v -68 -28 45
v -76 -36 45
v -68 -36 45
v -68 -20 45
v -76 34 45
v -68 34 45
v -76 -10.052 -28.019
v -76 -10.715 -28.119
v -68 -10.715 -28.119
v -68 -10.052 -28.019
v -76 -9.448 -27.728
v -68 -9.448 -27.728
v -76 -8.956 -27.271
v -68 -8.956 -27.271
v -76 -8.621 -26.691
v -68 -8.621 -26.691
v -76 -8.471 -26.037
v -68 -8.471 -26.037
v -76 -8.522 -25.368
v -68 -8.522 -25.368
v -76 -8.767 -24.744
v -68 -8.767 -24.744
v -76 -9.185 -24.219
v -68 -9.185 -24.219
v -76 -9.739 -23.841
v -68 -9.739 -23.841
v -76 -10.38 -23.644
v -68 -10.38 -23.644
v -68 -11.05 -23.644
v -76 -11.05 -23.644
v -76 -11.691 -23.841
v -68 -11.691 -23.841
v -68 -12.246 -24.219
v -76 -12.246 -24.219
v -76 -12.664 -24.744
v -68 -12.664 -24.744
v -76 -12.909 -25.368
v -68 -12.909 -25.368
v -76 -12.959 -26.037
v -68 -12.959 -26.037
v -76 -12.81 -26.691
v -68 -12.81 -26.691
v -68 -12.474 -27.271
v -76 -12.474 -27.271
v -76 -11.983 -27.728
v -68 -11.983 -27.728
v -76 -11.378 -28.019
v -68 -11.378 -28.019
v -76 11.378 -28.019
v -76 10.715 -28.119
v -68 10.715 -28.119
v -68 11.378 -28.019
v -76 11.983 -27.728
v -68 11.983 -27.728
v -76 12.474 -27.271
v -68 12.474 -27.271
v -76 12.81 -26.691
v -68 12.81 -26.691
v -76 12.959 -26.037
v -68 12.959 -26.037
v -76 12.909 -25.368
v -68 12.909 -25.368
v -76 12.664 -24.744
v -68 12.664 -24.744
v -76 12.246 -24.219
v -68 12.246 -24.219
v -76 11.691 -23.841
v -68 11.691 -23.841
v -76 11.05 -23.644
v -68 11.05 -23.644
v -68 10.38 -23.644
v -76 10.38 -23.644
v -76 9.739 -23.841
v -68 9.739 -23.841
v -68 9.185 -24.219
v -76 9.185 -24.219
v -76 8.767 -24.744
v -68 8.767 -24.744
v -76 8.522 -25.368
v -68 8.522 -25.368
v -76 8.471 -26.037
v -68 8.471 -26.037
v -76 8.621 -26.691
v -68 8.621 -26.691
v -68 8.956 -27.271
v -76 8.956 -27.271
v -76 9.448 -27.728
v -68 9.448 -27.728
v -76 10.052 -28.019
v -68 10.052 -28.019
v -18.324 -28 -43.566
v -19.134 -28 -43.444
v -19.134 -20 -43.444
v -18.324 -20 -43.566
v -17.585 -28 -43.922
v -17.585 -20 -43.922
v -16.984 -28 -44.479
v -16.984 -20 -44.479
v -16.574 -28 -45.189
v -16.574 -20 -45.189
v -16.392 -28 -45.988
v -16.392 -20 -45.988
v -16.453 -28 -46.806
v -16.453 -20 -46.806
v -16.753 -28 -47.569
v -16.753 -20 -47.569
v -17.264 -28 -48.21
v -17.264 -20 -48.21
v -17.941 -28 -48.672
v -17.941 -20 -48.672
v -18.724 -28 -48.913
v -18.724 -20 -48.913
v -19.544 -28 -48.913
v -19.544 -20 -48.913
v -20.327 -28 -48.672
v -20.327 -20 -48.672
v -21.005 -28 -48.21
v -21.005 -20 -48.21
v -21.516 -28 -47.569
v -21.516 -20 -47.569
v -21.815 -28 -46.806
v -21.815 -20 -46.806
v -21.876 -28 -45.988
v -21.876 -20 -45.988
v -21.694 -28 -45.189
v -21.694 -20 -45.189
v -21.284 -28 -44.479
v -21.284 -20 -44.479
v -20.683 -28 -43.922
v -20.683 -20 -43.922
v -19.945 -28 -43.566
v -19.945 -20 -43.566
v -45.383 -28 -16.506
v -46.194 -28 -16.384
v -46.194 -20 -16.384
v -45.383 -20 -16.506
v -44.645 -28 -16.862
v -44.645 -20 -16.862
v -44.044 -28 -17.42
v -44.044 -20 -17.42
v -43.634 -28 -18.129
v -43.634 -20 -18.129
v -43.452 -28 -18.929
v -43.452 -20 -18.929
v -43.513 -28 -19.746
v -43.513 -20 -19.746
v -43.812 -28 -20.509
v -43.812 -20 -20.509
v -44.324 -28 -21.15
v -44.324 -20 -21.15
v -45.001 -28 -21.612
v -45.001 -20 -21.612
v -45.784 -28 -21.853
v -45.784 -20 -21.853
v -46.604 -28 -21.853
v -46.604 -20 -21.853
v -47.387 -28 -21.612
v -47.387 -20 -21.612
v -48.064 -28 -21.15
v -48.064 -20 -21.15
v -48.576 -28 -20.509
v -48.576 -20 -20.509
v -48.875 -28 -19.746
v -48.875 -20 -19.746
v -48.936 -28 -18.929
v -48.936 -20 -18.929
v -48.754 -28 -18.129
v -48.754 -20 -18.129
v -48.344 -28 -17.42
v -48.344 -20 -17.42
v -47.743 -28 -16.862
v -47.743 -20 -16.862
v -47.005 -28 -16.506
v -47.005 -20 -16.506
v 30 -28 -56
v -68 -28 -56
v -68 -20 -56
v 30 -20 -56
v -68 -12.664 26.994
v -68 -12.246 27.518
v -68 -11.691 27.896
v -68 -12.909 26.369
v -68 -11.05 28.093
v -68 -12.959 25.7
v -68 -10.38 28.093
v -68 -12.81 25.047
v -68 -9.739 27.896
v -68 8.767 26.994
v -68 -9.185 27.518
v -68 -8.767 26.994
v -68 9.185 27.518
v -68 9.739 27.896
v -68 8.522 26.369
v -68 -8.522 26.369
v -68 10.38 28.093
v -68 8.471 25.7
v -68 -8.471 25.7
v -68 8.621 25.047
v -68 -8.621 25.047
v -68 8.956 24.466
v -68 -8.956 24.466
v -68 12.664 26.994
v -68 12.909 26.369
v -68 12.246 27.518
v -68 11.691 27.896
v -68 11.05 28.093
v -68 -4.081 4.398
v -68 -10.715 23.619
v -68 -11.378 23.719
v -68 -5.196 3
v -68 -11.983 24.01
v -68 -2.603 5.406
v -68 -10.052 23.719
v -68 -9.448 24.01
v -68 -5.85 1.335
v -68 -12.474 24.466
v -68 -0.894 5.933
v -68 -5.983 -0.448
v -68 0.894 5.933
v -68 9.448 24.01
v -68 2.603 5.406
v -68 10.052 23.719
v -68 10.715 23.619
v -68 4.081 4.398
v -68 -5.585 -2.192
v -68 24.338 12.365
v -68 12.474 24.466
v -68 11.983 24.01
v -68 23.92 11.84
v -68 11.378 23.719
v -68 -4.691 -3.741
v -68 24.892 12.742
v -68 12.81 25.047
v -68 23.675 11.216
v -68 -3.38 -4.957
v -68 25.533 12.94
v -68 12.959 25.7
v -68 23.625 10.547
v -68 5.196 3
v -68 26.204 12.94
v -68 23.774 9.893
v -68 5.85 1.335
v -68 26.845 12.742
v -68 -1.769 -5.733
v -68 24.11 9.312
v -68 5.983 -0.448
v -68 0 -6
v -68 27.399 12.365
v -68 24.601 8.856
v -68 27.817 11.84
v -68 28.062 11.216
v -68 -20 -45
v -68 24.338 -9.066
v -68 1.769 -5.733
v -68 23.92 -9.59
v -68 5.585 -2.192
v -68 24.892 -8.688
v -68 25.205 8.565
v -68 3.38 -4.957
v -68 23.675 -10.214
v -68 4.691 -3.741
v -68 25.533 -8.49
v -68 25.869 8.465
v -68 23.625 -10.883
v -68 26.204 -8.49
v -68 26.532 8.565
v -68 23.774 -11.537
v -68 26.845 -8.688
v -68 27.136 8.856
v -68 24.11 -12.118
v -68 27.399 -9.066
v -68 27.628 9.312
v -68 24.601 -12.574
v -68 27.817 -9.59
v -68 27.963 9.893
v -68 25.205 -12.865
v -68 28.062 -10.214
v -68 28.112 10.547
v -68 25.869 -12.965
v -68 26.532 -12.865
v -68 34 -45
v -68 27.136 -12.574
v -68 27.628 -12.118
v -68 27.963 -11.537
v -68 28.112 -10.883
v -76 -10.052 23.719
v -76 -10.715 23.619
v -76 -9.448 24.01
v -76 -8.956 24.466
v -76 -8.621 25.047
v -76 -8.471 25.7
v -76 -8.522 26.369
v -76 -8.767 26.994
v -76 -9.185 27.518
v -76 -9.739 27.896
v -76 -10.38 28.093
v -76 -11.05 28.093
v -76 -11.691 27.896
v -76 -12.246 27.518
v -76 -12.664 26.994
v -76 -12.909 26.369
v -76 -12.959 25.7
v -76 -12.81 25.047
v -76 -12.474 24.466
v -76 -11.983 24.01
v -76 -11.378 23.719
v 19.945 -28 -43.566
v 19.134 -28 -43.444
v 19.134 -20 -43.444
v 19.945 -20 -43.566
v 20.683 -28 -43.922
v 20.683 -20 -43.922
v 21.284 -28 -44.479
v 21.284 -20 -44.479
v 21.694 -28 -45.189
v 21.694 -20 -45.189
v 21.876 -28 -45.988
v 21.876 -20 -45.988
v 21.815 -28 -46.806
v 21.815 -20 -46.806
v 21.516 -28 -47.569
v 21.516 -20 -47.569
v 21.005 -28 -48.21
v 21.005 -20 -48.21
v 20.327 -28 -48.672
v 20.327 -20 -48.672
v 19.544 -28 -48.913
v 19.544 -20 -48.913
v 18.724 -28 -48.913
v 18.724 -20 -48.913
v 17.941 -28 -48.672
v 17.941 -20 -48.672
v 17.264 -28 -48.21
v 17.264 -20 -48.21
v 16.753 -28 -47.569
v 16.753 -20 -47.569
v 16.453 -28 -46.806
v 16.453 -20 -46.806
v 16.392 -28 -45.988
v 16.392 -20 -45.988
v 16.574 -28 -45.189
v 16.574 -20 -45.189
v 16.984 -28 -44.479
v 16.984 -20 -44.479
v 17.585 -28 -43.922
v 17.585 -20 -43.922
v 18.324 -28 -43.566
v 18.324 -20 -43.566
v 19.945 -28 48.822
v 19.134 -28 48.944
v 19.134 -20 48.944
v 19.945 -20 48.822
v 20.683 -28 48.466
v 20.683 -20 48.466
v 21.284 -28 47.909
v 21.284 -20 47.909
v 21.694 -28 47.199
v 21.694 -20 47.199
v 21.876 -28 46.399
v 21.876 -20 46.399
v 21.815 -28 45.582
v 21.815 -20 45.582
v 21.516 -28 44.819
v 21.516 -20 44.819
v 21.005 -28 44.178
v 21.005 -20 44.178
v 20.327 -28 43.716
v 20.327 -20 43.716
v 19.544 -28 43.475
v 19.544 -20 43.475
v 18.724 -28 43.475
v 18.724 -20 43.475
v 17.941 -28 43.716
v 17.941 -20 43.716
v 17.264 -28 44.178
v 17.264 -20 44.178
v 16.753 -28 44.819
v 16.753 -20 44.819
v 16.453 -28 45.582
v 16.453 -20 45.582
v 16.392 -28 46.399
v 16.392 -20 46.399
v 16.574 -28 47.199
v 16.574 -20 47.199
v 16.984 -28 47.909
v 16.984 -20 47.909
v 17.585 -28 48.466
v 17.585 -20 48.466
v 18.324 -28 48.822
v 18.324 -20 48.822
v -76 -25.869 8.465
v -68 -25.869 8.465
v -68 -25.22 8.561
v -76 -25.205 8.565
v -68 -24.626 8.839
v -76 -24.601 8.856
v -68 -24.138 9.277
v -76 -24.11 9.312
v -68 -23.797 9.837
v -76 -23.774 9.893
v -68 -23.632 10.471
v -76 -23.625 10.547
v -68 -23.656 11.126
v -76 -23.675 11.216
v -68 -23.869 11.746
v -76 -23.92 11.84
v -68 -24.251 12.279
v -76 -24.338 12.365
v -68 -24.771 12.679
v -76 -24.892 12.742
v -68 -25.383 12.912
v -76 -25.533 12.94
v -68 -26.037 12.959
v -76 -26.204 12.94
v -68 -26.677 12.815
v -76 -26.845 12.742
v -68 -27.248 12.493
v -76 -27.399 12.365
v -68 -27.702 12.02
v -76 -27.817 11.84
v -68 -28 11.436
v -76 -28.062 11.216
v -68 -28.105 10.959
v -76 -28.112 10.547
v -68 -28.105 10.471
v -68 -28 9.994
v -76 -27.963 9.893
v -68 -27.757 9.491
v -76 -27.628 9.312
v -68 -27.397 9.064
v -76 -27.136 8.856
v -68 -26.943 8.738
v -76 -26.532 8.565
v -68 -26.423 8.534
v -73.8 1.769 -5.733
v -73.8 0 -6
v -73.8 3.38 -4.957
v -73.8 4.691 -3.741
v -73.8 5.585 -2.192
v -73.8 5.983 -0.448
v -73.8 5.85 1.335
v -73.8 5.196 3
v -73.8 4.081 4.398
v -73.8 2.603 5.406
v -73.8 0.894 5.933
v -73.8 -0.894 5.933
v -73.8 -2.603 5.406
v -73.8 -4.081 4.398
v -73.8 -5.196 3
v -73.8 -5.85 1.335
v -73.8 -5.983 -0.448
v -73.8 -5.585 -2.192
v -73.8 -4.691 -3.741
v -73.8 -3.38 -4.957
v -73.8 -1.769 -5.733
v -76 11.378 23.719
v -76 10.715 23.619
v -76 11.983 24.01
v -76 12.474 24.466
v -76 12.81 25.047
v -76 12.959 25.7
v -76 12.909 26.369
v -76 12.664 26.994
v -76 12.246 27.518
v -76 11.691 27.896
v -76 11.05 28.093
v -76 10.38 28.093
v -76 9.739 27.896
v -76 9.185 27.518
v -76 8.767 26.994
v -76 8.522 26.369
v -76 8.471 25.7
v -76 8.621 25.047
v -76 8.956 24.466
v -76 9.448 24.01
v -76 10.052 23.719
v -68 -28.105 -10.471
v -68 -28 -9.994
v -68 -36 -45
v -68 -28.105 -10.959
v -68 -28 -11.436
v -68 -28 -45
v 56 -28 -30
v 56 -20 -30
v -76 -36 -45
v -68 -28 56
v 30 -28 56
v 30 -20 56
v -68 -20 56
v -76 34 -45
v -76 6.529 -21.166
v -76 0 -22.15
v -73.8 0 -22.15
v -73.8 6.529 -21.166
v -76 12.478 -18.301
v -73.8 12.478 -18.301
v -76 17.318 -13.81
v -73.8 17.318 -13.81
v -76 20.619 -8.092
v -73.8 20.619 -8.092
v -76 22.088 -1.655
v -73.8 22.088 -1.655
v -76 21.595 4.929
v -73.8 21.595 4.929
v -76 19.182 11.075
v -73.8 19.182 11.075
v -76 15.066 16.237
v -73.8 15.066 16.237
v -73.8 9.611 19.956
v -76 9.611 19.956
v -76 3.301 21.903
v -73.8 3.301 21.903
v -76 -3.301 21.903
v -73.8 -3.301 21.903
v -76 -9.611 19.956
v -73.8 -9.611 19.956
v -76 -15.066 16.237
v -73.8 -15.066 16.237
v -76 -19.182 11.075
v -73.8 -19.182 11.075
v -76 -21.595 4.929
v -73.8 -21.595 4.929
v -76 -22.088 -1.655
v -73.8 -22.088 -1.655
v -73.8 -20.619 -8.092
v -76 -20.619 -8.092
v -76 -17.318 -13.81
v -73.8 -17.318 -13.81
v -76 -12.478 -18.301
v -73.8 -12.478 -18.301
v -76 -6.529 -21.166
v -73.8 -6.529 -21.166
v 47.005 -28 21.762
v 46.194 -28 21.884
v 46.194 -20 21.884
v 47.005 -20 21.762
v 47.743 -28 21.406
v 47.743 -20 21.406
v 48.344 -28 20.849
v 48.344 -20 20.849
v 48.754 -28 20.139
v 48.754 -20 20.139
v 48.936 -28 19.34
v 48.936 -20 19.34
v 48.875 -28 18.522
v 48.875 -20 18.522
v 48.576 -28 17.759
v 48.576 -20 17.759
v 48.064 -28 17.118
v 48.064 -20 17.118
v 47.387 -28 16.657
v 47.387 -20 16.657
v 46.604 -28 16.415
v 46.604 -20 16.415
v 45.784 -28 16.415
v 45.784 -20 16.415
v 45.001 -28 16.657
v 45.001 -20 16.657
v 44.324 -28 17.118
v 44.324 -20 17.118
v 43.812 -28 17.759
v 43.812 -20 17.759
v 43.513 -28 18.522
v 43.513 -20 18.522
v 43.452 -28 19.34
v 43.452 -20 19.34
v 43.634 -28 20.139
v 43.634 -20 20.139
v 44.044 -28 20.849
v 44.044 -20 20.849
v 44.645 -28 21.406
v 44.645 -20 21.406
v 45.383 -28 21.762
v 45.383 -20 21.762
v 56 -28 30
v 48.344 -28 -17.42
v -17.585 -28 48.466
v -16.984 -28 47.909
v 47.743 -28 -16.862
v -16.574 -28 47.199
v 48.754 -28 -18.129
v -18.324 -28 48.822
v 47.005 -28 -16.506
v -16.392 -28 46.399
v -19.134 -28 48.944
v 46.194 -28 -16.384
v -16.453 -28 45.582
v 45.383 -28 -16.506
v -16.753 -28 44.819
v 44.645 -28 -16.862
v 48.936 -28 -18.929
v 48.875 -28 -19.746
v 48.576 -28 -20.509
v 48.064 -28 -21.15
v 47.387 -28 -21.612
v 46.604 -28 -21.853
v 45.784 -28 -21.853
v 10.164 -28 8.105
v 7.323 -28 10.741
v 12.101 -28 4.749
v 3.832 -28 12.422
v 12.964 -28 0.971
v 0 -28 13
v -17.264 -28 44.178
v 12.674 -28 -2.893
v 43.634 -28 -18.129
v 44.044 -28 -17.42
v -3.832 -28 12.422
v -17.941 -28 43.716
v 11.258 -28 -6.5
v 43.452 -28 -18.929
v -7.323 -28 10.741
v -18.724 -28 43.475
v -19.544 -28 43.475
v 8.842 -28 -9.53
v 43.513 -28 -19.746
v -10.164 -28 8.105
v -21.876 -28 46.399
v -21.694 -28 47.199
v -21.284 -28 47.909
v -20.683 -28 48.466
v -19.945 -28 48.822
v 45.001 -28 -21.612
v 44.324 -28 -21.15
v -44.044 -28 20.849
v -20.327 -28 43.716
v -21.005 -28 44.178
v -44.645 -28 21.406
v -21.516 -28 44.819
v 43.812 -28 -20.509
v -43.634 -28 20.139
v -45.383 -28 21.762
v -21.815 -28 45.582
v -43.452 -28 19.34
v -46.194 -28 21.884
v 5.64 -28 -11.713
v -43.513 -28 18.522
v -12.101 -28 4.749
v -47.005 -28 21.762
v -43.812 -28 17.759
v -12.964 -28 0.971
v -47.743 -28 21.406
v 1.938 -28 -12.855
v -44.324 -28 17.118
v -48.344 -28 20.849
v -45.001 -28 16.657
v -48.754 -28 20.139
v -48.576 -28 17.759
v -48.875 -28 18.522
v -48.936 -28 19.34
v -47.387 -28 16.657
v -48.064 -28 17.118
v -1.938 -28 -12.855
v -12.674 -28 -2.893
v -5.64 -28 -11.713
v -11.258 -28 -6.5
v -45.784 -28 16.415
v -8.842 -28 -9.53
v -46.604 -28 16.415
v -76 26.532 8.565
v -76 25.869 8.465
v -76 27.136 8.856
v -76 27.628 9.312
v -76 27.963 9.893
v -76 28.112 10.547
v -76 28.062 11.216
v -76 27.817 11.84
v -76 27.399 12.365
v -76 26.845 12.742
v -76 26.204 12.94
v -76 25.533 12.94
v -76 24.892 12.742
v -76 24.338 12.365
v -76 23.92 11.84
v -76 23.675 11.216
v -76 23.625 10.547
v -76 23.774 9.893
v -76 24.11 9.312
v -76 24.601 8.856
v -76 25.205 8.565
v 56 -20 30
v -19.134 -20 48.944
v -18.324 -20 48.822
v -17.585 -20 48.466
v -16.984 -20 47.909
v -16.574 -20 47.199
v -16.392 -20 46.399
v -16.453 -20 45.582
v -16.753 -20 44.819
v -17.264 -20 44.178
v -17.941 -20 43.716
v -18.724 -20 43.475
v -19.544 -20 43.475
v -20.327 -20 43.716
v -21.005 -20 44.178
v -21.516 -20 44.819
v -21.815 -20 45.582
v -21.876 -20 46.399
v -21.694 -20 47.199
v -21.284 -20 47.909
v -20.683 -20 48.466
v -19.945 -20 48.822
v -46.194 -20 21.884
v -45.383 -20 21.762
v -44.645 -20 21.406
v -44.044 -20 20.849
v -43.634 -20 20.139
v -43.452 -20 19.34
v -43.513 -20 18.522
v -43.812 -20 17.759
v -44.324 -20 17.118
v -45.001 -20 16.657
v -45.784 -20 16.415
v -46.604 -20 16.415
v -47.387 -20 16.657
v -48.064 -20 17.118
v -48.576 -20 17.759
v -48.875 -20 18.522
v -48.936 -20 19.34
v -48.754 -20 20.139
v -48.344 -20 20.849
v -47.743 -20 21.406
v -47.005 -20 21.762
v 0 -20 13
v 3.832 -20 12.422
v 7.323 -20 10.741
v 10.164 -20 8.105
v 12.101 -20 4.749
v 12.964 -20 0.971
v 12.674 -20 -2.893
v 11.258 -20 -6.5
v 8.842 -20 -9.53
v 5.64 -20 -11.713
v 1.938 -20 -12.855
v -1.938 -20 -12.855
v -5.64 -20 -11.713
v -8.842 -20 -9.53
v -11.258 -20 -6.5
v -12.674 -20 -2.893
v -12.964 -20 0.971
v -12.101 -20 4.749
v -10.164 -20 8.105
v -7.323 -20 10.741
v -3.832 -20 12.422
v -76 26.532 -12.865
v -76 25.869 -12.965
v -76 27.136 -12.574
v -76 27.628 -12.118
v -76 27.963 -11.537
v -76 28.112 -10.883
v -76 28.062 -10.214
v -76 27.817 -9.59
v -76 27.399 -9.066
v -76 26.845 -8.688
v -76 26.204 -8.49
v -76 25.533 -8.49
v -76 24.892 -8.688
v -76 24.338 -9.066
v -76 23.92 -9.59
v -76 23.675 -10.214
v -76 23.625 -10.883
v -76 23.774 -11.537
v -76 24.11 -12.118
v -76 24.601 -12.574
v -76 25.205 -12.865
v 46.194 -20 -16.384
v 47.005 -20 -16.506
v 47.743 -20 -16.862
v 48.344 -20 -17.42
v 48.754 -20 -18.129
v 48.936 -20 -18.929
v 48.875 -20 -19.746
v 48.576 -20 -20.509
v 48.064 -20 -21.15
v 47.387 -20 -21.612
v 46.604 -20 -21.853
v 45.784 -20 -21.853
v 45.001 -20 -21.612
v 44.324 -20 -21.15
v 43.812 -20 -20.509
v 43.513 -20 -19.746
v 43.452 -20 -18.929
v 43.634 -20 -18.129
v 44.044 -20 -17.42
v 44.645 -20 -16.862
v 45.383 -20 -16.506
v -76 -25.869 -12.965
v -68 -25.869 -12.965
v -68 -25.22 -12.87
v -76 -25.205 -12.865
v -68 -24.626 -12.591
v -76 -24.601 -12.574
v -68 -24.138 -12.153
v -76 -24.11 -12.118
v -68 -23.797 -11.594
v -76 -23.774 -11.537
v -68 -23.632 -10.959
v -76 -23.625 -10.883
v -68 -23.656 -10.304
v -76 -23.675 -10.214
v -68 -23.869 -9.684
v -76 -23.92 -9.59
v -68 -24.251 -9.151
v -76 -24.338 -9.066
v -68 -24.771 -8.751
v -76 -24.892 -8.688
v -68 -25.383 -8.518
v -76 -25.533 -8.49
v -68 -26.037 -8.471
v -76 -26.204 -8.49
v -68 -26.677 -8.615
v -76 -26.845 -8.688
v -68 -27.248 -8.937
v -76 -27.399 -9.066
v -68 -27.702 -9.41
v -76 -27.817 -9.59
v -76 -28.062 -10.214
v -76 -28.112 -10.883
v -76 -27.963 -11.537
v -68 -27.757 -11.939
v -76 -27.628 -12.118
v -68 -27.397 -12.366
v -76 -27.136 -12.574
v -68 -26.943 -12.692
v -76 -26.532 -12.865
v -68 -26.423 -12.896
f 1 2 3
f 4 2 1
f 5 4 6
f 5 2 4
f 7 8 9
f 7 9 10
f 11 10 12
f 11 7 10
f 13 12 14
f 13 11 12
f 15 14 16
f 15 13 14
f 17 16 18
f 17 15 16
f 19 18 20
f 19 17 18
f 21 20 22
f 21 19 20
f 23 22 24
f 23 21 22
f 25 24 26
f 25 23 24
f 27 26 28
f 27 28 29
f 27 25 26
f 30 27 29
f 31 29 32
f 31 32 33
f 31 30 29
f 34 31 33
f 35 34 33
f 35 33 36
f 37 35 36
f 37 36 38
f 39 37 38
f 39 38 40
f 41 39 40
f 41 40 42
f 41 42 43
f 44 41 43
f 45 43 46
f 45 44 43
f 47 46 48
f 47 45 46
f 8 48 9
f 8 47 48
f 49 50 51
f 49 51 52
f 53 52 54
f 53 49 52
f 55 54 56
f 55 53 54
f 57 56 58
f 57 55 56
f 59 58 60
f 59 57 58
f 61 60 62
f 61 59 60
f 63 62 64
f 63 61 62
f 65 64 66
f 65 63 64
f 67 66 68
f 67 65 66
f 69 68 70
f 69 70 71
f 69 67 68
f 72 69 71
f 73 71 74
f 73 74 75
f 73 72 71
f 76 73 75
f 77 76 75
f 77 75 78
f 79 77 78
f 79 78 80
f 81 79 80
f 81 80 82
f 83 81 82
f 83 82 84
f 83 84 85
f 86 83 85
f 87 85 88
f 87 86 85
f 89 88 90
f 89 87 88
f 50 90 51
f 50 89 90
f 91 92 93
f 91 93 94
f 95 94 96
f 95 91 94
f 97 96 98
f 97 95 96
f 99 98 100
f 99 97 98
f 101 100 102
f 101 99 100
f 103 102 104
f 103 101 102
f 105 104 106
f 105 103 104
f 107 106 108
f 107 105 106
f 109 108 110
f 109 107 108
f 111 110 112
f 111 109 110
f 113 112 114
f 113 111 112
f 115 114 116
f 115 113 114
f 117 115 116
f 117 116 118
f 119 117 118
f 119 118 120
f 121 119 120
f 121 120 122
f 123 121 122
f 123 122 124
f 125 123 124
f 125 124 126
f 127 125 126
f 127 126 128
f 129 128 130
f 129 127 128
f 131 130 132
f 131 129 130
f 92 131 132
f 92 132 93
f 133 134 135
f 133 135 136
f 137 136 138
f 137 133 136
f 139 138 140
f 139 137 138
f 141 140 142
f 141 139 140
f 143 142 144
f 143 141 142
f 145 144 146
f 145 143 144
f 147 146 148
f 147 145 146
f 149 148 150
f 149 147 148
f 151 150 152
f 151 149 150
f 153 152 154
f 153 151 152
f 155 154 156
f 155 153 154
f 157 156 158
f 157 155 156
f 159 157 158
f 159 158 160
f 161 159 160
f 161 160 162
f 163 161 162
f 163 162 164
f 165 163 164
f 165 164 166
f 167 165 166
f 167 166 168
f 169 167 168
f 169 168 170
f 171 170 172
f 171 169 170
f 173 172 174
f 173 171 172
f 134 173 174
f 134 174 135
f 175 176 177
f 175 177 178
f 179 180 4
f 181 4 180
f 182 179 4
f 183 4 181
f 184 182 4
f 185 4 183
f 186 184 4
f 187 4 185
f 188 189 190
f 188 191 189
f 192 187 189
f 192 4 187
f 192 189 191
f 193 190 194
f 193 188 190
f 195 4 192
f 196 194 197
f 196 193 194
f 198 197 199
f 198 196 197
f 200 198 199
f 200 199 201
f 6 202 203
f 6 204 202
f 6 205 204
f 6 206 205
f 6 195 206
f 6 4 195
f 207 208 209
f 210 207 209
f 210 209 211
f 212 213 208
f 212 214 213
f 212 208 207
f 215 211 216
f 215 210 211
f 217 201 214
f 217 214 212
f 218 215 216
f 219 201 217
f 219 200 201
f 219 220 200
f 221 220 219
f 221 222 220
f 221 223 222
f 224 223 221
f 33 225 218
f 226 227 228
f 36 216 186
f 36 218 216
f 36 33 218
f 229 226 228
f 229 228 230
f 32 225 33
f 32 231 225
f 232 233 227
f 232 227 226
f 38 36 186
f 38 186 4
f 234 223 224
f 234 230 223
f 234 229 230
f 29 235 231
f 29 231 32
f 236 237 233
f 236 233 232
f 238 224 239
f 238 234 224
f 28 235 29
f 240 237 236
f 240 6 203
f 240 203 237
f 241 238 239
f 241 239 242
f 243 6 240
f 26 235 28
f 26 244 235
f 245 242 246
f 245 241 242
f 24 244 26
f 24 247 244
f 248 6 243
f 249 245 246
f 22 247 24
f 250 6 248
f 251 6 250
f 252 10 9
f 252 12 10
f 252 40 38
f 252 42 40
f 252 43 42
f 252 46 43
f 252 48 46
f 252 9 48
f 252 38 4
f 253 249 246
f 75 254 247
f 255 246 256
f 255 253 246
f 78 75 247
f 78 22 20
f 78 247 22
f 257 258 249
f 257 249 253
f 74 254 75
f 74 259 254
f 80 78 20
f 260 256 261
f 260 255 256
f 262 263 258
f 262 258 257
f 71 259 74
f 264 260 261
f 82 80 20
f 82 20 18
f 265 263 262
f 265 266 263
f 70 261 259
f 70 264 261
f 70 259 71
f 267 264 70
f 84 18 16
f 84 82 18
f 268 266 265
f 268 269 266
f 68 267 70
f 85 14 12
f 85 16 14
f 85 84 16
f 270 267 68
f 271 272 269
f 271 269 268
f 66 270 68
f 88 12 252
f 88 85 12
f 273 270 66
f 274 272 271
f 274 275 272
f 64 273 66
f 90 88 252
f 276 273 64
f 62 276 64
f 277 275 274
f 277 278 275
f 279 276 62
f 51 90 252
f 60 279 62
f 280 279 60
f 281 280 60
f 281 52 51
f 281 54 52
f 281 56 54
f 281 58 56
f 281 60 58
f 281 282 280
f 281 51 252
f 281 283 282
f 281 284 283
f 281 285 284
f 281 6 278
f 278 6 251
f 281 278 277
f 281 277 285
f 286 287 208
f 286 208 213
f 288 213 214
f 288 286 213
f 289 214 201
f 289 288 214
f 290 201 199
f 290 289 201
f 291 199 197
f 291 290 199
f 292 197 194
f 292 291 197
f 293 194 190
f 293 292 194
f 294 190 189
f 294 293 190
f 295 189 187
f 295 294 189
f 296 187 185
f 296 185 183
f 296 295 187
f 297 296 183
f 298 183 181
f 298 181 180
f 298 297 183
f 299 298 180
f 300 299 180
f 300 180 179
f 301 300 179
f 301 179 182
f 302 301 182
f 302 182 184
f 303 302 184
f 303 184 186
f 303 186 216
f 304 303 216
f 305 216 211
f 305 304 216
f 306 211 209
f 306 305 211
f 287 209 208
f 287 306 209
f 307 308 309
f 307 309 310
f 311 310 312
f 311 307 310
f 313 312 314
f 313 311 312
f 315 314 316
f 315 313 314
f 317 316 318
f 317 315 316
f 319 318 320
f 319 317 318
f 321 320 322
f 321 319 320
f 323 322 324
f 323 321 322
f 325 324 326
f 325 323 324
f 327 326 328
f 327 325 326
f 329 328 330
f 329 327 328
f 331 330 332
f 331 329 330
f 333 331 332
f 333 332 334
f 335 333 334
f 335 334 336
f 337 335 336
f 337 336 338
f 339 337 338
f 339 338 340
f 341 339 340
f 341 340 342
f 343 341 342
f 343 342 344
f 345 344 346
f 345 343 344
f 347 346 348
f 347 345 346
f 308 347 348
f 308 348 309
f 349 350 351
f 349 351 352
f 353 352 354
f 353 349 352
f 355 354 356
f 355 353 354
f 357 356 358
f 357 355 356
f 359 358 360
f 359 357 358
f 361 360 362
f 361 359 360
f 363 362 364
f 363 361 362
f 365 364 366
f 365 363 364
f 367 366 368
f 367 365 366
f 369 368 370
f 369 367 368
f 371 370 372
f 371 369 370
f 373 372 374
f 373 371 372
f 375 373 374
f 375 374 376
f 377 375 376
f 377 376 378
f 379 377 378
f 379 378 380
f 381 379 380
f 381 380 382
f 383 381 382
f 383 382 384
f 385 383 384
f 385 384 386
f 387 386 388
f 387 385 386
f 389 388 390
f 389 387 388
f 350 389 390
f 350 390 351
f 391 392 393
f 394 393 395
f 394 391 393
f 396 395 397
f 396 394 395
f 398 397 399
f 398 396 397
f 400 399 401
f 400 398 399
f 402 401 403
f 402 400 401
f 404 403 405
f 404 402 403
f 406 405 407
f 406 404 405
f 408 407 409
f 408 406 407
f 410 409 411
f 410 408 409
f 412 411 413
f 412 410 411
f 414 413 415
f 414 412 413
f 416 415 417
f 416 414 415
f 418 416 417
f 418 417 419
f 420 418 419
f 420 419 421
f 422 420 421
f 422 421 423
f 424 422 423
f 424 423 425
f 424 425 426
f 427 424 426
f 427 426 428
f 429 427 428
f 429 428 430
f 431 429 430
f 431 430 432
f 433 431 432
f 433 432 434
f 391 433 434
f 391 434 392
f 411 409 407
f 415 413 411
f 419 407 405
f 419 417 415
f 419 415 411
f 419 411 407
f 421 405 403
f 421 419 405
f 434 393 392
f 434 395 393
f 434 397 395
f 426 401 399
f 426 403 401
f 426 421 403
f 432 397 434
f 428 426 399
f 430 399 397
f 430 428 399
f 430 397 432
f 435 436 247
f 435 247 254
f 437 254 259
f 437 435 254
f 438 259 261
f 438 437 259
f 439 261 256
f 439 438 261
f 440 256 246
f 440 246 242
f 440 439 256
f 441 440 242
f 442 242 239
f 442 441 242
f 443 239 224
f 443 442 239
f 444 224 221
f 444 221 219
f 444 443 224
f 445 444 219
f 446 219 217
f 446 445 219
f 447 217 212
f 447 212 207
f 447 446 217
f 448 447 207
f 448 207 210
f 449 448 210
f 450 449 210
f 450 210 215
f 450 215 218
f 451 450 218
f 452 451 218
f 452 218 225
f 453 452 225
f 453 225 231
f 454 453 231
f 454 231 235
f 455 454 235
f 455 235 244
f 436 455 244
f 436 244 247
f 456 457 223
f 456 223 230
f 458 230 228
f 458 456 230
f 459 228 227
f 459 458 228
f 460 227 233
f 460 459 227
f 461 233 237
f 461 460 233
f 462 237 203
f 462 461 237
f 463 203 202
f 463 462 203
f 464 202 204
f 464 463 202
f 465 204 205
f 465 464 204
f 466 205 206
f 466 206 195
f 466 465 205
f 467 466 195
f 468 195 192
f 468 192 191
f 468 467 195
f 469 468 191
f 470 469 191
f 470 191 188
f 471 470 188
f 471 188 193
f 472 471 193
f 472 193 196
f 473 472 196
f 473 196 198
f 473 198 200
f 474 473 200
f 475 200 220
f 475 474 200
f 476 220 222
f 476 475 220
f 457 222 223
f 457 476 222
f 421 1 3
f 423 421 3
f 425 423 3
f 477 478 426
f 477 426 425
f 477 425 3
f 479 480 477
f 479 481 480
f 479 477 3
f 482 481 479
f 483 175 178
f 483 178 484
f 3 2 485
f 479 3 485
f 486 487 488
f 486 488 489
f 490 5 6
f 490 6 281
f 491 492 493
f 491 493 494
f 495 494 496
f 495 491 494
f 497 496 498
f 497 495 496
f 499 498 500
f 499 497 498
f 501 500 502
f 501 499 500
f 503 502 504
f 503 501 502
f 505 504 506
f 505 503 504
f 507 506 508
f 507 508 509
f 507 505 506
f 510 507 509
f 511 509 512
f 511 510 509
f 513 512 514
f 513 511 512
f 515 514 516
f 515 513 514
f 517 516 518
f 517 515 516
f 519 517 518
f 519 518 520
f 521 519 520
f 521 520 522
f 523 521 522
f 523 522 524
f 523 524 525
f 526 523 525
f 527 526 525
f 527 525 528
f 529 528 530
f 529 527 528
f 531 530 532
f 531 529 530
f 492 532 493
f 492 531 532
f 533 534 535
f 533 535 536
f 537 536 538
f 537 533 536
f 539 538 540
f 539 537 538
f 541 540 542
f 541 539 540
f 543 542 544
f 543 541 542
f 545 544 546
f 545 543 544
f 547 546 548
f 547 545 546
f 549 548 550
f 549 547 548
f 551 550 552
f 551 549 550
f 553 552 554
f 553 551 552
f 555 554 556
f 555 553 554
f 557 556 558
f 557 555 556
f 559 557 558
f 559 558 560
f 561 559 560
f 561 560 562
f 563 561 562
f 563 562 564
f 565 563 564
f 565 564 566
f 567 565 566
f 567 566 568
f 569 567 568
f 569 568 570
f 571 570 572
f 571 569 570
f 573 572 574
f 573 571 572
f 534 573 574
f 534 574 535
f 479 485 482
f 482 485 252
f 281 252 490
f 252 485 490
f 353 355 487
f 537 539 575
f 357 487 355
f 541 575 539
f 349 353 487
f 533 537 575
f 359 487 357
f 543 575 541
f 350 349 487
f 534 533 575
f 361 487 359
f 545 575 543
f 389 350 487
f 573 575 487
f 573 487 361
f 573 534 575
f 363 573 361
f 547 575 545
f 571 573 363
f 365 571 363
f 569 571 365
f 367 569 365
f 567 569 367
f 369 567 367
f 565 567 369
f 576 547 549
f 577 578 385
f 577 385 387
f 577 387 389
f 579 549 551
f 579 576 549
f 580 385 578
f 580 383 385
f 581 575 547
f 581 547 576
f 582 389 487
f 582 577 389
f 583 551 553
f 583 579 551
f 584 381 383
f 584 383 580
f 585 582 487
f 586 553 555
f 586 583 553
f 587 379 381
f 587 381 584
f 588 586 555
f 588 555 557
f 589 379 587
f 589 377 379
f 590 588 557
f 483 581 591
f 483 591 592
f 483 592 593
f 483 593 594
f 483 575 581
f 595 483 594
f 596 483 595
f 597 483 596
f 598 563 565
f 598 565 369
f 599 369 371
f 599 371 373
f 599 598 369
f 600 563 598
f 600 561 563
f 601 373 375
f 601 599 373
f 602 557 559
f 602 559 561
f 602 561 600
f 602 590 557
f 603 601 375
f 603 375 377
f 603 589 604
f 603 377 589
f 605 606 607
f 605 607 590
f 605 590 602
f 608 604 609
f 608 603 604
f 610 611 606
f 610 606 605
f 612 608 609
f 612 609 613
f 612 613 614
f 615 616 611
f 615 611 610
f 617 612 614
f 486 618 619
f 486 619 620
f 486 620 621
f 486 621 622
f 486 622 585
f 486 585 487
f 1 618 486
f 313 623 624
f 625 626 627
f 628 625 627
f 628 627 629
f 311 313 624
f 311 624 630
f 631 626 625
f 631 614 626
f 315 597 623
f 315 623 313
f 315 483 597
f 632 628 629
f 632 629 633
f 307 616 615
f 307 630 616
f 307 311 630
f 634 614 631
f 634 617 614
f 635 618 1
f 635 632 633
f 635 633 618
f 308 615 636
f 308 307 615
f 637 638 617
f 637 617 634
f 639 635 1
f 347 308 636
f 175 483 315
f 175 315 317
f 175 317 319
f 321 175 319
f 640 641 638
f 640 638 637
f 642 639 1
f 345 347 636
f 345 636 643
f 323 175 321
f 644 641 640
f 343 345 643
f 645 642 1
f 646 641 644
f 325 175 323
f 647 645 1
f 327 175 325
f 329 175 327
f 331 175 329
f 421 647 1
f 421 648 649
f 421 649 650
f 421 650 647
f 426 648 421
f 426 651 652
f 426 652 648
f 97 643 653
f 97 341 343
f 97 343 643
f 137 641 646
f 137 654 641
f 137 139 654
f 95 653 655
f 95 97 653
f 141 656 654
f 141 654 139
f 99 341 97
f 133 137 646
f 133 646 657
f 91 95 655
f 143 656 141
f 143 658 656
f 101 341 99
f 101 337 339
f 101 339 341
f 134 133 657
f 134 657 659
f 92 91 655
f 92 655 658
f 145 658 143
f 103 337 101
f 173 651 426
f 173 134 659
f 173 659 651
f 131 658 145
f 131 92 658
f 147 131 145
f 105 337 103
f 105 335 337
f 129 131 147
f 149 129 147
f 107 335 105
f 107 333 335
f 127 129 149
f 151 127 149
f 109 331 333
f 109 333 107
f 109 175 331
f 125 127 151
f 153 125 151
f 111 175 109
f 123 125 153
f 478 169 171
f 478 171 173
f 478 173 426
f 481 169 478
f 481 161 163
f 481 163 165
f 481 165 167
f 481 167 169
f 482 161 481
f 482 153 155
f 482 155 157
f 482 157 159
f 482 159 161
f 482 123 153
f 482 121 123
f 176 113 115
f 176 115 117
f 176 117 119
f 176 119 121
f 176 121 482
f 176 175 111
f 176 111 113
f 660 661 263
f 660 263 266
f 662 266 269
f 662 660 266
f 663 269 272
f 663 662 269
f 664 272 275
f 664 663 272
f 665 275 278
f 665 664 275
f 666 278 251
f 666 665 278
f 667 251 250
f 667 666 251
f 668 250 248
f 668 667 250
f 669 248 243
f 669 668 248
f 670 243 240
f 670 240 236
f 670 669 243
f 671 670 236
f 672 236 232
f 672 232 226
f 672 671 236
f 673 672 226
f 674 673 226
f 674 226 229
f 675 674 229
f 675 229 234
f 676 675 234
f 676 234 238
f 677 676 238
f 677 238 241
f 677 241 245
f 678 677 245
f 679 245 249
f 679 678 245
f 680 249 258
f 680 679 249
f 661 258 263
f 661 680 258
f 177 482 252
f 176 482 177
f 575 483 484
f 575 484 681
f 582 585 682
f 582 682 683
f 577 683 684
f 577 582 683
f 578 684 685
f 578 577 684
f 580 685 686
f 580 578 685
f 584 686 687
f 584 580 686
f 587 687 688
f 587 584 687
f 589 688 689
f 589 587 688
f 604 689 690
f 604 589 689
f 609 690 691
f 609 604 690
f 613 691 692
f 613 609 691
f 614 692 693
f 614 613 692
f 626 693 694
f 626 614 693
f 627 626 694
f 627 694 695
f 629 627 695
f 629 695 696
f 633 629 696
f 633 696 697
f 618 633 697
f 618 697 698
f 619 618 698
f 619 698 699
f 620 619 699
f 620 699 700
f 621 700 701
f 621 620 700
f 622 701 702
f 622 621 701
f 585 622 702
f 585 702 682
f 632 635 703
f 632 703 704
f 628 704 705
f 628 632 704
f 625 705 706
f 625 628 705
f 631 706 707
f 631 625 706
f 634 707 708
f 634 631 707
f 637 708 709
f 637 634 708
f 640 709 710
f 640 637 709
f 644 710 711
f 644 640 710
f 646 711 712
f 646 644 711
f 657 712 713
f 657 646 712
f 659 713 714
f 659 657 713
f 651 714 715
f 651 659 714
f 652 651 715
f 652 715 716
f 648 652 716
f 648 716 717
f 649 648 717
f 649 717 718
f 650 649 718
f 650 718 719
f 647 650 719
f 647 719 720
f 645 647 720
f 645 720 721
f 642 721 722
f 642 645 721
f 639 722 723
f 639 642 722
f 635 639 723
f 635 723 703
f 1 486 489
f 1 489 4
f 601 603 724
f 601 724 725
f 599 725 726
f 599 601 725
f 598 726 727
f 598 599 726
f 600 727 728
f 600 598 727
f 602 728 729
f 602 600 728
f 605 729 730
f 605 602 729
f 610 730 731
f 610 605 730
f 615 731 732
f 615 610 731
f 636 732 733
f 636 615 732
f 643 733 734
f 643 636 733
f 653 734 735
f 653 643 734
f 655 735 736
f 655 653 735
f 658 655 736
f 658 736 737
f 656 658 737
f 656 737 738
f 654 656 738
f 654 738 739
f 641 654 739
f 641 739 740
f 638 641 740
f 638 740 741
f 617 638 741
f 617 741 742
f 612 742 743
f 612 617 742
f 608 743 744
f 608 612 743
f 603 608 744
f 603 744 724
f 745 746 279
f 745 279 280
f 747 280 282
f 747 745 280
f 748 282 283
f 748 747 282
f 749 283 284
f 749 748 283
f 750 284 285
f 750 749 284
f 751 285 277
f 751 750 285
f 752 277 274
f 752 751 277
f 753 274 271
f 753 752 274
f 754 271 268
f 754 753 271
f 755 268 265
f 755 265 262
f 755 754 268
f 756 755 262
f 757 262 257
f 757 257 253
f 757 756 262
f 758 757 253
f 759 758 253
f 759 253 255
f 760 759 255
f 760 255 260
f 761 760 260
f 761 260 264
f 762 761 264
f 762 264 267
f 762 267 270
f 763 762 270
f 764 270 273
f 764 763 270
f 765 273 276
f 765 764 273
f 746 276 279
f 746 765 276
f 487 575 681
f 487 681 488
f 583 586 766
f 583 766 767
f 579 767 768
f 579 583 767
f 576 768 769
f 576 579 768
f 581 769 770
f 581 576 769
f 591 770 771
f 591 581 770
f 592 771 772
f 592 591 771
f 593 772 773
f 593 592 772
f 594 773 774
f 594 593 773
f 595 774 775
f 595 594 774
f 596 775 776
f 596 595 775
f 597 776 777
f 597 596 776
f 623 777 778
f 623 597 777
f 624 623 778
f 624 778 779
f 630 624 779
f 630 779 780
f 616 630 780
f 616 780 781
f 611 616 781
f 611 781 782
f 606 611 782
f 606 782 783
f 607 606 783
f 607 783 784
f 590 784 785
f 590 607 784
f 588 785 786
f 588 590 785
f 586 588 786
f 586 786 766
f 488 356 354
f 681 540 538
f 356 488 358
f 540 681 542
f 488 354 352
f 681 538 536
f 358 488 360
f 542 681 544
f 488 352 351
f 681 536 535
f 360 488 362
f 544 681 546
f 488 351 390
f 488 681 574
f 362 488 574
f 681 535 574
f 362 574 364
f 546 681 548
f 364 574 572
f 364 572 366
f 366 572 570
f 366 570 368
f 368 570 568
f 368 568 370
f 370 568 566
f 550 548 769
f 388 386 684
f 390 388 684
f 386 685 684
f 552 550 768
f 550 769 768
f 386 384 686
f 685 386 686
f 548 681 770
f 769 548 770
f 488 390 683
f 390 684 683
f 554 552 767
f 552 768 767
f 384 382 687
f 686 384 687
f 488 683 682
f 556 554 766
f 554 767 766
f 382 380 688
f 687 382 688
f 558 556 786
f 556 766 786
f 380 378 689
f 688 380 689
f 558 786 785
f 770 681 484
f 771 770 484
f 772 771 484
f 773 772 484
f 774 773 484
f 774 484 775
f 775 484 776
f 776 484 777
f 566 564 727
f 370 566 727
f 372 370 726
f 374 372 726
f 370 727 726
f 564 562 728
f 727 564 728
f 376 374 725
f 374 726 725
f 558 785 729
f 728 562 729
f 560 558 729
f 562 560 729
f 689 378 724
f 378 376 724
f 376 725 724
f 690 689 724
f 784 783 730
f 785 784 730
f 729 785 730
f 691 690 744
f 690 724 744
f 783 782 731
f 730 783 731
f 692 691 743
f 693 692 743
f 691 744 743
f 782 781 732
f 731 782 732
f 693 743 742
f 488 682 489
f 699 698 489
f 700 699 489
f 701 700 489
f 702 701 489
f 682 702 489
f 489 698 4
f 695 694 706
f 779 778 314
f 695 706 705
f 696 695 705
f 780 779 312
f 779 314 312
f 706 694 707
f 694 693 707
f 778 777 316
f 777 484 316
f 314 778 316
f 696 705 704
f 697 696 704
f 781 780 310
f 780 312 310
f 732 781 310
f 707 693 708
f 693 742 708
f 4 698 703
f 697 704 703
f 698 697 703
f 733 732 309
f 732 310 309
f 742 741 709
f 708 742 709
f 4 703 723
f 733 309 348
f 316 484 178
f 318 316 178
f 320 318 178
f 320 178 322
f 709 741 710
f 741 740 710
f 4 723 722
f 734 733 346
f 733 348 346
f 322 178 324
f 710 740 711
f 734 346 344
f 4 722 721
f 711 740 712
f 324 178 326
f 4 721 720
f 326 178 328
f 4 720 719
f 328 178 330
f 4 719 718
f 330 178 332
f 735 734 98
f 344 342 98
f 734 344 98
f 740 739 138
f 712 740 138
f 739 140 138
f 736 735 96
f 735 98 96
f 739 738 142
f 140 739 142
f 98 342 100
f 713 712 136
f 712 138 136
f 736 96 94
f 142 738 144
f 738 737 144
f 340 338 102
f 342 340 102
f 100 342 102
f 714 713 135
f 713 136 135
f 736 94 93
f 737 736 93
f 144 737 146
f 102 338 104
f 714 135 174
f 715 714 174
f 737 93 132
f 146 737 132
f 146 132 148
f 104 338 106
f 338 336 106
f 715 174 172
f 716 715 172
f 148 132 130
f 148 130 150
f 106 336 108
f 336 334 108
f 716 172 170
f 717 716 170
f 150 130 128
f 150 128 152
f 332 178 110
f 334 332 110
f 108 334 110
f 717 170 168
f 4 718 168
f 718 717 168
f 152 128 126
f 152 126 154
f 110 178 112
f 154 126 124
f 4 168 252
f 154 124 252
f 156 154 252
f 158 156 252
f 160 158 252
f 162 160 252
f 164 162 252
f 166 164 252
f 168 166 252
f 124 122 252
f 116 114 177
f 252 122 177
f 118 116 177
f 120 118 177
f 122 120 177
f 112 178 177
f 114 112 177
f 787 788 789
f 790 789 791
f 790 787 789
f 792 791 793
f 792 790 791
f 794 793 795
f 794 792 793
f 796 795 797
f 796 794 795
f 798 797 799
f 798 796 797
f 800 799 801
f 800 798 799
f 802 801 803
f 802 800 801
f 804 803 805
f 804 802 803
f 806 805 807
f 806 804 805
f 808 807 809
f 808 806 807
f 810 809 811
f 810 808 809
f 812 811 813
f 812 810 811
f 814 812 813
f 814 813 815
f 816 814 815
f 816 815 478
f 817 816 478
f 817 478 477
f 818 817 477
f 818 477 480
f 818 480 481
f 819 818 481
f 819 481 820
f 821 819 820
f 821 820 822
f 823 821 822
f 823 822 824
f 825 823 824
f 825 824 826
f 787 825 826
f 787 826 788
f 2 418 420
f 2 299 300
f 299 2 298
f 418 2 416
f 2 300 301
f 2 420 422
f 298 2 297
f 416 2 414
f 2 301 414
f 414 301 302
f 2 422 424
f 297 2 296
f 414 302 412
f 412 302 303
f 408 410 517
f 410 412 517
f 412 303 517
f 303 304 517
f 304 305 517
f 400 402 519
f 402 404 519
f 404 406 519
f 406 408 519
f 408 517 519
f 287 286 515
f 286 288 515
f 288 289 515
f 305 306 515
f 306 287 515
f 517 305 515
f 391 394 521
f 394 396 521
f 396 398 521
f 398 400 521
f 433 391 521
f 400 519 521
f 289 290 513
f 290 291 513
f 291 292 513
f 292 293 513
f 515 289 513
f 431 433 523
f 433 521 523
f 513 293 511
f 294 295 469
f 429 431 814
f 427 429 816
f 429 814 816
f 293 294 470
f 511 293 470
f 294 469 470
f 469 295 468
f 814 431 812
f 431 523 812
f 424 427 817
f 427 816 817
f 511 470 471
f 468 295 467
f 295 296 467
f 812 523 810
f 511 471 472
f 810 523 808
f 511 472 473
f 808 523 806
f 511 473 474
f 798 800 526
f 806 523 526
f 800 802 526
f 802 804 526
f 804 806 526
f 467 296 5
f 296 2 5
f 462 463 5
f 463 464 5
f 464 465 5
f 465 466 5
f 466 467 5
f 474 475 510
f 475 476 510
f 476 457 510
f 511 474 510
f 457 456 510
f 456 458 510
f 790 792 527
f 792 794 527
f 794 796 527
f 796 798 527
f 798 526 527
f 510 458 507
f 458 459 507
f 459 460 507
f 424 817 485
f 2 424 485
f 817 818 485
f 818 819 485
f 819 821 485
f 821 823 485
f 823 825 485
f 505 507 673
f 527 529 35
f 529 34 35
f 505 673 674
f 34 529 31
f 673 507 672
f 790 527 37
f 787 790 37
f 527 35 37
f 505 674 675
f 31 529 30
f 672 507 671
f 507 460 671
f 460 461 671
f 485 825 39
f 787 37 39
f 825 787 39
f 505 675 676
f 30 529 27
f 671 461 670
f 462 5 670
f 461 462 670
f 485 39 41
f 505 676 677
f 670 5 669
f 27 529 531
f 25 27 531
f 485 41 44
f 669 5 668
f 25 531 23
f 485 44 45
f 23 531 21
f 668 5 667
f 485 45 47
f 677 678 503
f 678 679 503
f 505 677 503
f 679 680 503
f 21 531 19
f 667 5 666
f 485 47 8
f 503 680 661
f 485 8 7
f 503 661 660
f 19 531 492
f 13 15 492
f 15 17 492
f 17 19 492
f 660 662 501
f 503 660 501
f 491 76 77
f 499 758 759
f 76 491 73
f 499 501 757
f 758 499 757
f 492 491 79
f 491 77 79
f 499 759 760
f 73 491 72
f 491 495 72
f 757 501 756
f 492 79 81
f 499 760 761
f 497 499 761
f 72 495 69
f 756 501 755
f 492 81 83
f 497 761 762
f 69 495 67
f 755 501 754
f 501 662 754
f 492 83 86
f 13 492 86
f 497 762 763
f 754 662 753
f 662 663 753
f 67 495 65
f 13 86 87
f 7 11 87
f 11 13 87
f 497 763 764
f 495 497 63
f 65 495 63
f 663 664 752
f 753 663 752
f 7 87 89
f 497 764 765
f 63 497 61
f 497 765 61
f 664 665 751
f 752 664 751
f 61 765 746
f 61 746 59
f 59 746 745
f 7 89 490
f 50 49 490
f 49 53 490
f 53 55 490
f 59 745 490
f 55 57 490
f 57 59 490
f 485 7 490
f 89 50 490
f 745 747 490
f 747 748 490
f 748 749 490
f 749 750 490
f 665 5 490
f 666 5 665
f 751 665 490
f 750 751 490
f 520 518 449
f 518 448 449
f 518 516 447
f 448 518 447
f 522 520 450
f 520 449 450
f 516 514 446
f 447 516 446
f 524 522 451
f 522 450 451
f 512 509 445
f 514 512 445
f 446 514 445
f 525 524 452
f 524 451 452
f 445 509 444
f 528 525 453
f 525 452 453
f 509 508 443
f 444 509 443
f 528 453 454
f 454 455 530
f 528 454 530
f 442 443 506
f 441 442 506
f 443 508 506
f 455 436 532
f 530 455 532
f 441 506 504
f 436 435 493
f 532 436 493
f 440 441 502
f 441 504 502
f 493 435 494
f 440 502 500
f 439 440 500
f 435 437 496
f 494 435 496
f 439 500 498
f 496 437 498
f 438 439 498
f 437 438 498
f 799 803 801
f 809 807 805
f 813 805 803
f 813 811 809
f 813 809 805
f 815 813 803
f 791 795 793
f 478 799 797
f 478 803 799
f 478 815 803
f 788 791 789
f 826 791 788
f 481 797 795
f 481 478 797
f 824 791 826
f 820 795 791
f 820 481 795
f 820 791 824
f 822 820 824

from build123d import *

# Parameters (mm, degrees)
SK_BACK_PLATE_W         = 90
SK_BACK_PLATE_H         = 70
SK_BACK_PLATE_R         = 2.25
SK_BACK_PLATE_R_2       = 6
BACK_PLATE_DEPTH        = 8
SK_ROLL_PILOT_RECESS_R  = 22.15
ROLL_PILOT_RECESS_DEPTH = 2.2
SK_MEDIAL_PLATE_R       = 2.75
SK_MEDIAL_PLATE_R_2     = 13
MEDIAL_PLATE_DEPTH      = 8


with BuildPart() as part:
    # SK_Back_Plate → Back_Plate (new body)
    with BuildSketch(Plane(origin=(-76, 0, 0), x_dir=(0, 0, -1), z_dir=(1, 0, 0))):
        with Locations((0, -1)):
            Rectangle(SK_BACK_PLATE_W, SK_BACK_PLATE_H)
        with Locations((25.86862691, 10.715136106)):
            Circle(SK_BACK_PLATE_R, mode=Mode.SUBTRACT)
        with Locations((10.715136106, 25.86862691)):
            Circle(SK_BACK_PLATE_R, mode=Mode.SUBTRACT)
        with Locations((-10.715136106, 25.86862691)):
            Circle(SK_BACK_PLATE_R, mode=Mode.SUBTRACT)
        with Locations((-25.86862691, 10.715136106)):
            Circle(SK_BACK_PLATE_R, mode=Mode.SUBTRACT)
        with Locations((-25.86862691, -10.715136106)):
            Circle(SK_BACK_PLATE_R, mode=Mode.SUBTRACT)
        with Locations((-10.715136106, -25.86862691)):
            Circle(SK_BACK_PLATE_R, mode=Mode.SUBTRACT)
        with Locations((10.715136106, -25.86862691)):
            Circle(SK_BACK_PLATE_R, mode=Mode.SUBTRACT)
        with Locations((25.86862691, -10.715136106)):
            Circle(SK_BACK_PLATE_R, mode=Mode.SUBTRACT)
        Circle(SK_BACK_PLATE_R_2, mode=Mode.SUBTRACT)
    extrude(amount=BACK_PLATE_DEPTH)

    # SK_Roll_Pilot_Recess → Roll_Pilot_Recess (cut)
    with BuildSketch(Plane(origin=(-76, 0, 0), x_dir=(0, 0, -1), z_dir=(1, 0, 0))):
        Circle(SK_ROLL_PILOT_RECESS_R)
    extrude(amount=ROLL_PILOT_RECESS_DEPTH, mode=Mode.SUBTRACT)

    # SK_Medial_Plate → Medial_Plate (add)
    with BuildSketch(Plane(origin=(0, -28, 0), x_dir=(1, 0, 0), z_dir=(0, 1, 0))):
        Polygon((-68, 56), (30, 56), (56, 30), (56, -30), (30, -56), (-68, -56), align=None)
        with Locations(Location((46.193976626, 19.134171618, 0), (0, 0, 270))):
            Circle(SK_MEDIAL_PLATE_R, mode=Mode.SUBTRACT)
        with Locations(Location((19.134171618, 46.193976626, 0), (0, 0, 270))):
            Circle(SK_MEDIAL_PLATE_R, mode=Mode.SUBTRACT)
        with Locations(Location((-19.134171618, 46.193976626, 0), (0, 0, 270))):
            Circle(SK_MEDIAL_PLATE_R, mode=Mode.SUBTRACT)
        with Locations(Location((-46.193976626, 19.134171618, 0), (0, 0, 270))):
            Circle(SK_MEDIAL_PLATE_R, mode=Mode.SUBTRACT)
        with Locations(Location((-46.193976626, -19.134171618, 0), (0, 0, 270))):
            Circle(SK_MEDIAL_PLATE_R, mode=Mode.SUBTRACT)
        with Locations(Location((-19.134171618, -46.193976626, 0), (0, 0, 270))):
            Circle(SK_MEDIAL_PLATE_R, mode=Mode.SUBTRACT)
        with Locations(Location((19.134171618, -46.193976626, 0), (0, 0, 270))):
            Circle(SK_MEDIAL_PLATE_R, mode=Mode.SUBTRACT)
        with Locations(Location((46.193976626, -19.134171618, 0), (0, 0, 270))):
            Circle(SK_MEDIAL_PLATE_R, mode=Mode.SUBTRACT)
        with Locations(Location((0, 0, 0), (0, 0, 270))):
            Circle(SK_MEDIAL_PLATE_R_2, mode=Mode.SUBTRACT)
    extrude(amount=MEDIAL_PLATE_DEPTH)


solid = part.part
